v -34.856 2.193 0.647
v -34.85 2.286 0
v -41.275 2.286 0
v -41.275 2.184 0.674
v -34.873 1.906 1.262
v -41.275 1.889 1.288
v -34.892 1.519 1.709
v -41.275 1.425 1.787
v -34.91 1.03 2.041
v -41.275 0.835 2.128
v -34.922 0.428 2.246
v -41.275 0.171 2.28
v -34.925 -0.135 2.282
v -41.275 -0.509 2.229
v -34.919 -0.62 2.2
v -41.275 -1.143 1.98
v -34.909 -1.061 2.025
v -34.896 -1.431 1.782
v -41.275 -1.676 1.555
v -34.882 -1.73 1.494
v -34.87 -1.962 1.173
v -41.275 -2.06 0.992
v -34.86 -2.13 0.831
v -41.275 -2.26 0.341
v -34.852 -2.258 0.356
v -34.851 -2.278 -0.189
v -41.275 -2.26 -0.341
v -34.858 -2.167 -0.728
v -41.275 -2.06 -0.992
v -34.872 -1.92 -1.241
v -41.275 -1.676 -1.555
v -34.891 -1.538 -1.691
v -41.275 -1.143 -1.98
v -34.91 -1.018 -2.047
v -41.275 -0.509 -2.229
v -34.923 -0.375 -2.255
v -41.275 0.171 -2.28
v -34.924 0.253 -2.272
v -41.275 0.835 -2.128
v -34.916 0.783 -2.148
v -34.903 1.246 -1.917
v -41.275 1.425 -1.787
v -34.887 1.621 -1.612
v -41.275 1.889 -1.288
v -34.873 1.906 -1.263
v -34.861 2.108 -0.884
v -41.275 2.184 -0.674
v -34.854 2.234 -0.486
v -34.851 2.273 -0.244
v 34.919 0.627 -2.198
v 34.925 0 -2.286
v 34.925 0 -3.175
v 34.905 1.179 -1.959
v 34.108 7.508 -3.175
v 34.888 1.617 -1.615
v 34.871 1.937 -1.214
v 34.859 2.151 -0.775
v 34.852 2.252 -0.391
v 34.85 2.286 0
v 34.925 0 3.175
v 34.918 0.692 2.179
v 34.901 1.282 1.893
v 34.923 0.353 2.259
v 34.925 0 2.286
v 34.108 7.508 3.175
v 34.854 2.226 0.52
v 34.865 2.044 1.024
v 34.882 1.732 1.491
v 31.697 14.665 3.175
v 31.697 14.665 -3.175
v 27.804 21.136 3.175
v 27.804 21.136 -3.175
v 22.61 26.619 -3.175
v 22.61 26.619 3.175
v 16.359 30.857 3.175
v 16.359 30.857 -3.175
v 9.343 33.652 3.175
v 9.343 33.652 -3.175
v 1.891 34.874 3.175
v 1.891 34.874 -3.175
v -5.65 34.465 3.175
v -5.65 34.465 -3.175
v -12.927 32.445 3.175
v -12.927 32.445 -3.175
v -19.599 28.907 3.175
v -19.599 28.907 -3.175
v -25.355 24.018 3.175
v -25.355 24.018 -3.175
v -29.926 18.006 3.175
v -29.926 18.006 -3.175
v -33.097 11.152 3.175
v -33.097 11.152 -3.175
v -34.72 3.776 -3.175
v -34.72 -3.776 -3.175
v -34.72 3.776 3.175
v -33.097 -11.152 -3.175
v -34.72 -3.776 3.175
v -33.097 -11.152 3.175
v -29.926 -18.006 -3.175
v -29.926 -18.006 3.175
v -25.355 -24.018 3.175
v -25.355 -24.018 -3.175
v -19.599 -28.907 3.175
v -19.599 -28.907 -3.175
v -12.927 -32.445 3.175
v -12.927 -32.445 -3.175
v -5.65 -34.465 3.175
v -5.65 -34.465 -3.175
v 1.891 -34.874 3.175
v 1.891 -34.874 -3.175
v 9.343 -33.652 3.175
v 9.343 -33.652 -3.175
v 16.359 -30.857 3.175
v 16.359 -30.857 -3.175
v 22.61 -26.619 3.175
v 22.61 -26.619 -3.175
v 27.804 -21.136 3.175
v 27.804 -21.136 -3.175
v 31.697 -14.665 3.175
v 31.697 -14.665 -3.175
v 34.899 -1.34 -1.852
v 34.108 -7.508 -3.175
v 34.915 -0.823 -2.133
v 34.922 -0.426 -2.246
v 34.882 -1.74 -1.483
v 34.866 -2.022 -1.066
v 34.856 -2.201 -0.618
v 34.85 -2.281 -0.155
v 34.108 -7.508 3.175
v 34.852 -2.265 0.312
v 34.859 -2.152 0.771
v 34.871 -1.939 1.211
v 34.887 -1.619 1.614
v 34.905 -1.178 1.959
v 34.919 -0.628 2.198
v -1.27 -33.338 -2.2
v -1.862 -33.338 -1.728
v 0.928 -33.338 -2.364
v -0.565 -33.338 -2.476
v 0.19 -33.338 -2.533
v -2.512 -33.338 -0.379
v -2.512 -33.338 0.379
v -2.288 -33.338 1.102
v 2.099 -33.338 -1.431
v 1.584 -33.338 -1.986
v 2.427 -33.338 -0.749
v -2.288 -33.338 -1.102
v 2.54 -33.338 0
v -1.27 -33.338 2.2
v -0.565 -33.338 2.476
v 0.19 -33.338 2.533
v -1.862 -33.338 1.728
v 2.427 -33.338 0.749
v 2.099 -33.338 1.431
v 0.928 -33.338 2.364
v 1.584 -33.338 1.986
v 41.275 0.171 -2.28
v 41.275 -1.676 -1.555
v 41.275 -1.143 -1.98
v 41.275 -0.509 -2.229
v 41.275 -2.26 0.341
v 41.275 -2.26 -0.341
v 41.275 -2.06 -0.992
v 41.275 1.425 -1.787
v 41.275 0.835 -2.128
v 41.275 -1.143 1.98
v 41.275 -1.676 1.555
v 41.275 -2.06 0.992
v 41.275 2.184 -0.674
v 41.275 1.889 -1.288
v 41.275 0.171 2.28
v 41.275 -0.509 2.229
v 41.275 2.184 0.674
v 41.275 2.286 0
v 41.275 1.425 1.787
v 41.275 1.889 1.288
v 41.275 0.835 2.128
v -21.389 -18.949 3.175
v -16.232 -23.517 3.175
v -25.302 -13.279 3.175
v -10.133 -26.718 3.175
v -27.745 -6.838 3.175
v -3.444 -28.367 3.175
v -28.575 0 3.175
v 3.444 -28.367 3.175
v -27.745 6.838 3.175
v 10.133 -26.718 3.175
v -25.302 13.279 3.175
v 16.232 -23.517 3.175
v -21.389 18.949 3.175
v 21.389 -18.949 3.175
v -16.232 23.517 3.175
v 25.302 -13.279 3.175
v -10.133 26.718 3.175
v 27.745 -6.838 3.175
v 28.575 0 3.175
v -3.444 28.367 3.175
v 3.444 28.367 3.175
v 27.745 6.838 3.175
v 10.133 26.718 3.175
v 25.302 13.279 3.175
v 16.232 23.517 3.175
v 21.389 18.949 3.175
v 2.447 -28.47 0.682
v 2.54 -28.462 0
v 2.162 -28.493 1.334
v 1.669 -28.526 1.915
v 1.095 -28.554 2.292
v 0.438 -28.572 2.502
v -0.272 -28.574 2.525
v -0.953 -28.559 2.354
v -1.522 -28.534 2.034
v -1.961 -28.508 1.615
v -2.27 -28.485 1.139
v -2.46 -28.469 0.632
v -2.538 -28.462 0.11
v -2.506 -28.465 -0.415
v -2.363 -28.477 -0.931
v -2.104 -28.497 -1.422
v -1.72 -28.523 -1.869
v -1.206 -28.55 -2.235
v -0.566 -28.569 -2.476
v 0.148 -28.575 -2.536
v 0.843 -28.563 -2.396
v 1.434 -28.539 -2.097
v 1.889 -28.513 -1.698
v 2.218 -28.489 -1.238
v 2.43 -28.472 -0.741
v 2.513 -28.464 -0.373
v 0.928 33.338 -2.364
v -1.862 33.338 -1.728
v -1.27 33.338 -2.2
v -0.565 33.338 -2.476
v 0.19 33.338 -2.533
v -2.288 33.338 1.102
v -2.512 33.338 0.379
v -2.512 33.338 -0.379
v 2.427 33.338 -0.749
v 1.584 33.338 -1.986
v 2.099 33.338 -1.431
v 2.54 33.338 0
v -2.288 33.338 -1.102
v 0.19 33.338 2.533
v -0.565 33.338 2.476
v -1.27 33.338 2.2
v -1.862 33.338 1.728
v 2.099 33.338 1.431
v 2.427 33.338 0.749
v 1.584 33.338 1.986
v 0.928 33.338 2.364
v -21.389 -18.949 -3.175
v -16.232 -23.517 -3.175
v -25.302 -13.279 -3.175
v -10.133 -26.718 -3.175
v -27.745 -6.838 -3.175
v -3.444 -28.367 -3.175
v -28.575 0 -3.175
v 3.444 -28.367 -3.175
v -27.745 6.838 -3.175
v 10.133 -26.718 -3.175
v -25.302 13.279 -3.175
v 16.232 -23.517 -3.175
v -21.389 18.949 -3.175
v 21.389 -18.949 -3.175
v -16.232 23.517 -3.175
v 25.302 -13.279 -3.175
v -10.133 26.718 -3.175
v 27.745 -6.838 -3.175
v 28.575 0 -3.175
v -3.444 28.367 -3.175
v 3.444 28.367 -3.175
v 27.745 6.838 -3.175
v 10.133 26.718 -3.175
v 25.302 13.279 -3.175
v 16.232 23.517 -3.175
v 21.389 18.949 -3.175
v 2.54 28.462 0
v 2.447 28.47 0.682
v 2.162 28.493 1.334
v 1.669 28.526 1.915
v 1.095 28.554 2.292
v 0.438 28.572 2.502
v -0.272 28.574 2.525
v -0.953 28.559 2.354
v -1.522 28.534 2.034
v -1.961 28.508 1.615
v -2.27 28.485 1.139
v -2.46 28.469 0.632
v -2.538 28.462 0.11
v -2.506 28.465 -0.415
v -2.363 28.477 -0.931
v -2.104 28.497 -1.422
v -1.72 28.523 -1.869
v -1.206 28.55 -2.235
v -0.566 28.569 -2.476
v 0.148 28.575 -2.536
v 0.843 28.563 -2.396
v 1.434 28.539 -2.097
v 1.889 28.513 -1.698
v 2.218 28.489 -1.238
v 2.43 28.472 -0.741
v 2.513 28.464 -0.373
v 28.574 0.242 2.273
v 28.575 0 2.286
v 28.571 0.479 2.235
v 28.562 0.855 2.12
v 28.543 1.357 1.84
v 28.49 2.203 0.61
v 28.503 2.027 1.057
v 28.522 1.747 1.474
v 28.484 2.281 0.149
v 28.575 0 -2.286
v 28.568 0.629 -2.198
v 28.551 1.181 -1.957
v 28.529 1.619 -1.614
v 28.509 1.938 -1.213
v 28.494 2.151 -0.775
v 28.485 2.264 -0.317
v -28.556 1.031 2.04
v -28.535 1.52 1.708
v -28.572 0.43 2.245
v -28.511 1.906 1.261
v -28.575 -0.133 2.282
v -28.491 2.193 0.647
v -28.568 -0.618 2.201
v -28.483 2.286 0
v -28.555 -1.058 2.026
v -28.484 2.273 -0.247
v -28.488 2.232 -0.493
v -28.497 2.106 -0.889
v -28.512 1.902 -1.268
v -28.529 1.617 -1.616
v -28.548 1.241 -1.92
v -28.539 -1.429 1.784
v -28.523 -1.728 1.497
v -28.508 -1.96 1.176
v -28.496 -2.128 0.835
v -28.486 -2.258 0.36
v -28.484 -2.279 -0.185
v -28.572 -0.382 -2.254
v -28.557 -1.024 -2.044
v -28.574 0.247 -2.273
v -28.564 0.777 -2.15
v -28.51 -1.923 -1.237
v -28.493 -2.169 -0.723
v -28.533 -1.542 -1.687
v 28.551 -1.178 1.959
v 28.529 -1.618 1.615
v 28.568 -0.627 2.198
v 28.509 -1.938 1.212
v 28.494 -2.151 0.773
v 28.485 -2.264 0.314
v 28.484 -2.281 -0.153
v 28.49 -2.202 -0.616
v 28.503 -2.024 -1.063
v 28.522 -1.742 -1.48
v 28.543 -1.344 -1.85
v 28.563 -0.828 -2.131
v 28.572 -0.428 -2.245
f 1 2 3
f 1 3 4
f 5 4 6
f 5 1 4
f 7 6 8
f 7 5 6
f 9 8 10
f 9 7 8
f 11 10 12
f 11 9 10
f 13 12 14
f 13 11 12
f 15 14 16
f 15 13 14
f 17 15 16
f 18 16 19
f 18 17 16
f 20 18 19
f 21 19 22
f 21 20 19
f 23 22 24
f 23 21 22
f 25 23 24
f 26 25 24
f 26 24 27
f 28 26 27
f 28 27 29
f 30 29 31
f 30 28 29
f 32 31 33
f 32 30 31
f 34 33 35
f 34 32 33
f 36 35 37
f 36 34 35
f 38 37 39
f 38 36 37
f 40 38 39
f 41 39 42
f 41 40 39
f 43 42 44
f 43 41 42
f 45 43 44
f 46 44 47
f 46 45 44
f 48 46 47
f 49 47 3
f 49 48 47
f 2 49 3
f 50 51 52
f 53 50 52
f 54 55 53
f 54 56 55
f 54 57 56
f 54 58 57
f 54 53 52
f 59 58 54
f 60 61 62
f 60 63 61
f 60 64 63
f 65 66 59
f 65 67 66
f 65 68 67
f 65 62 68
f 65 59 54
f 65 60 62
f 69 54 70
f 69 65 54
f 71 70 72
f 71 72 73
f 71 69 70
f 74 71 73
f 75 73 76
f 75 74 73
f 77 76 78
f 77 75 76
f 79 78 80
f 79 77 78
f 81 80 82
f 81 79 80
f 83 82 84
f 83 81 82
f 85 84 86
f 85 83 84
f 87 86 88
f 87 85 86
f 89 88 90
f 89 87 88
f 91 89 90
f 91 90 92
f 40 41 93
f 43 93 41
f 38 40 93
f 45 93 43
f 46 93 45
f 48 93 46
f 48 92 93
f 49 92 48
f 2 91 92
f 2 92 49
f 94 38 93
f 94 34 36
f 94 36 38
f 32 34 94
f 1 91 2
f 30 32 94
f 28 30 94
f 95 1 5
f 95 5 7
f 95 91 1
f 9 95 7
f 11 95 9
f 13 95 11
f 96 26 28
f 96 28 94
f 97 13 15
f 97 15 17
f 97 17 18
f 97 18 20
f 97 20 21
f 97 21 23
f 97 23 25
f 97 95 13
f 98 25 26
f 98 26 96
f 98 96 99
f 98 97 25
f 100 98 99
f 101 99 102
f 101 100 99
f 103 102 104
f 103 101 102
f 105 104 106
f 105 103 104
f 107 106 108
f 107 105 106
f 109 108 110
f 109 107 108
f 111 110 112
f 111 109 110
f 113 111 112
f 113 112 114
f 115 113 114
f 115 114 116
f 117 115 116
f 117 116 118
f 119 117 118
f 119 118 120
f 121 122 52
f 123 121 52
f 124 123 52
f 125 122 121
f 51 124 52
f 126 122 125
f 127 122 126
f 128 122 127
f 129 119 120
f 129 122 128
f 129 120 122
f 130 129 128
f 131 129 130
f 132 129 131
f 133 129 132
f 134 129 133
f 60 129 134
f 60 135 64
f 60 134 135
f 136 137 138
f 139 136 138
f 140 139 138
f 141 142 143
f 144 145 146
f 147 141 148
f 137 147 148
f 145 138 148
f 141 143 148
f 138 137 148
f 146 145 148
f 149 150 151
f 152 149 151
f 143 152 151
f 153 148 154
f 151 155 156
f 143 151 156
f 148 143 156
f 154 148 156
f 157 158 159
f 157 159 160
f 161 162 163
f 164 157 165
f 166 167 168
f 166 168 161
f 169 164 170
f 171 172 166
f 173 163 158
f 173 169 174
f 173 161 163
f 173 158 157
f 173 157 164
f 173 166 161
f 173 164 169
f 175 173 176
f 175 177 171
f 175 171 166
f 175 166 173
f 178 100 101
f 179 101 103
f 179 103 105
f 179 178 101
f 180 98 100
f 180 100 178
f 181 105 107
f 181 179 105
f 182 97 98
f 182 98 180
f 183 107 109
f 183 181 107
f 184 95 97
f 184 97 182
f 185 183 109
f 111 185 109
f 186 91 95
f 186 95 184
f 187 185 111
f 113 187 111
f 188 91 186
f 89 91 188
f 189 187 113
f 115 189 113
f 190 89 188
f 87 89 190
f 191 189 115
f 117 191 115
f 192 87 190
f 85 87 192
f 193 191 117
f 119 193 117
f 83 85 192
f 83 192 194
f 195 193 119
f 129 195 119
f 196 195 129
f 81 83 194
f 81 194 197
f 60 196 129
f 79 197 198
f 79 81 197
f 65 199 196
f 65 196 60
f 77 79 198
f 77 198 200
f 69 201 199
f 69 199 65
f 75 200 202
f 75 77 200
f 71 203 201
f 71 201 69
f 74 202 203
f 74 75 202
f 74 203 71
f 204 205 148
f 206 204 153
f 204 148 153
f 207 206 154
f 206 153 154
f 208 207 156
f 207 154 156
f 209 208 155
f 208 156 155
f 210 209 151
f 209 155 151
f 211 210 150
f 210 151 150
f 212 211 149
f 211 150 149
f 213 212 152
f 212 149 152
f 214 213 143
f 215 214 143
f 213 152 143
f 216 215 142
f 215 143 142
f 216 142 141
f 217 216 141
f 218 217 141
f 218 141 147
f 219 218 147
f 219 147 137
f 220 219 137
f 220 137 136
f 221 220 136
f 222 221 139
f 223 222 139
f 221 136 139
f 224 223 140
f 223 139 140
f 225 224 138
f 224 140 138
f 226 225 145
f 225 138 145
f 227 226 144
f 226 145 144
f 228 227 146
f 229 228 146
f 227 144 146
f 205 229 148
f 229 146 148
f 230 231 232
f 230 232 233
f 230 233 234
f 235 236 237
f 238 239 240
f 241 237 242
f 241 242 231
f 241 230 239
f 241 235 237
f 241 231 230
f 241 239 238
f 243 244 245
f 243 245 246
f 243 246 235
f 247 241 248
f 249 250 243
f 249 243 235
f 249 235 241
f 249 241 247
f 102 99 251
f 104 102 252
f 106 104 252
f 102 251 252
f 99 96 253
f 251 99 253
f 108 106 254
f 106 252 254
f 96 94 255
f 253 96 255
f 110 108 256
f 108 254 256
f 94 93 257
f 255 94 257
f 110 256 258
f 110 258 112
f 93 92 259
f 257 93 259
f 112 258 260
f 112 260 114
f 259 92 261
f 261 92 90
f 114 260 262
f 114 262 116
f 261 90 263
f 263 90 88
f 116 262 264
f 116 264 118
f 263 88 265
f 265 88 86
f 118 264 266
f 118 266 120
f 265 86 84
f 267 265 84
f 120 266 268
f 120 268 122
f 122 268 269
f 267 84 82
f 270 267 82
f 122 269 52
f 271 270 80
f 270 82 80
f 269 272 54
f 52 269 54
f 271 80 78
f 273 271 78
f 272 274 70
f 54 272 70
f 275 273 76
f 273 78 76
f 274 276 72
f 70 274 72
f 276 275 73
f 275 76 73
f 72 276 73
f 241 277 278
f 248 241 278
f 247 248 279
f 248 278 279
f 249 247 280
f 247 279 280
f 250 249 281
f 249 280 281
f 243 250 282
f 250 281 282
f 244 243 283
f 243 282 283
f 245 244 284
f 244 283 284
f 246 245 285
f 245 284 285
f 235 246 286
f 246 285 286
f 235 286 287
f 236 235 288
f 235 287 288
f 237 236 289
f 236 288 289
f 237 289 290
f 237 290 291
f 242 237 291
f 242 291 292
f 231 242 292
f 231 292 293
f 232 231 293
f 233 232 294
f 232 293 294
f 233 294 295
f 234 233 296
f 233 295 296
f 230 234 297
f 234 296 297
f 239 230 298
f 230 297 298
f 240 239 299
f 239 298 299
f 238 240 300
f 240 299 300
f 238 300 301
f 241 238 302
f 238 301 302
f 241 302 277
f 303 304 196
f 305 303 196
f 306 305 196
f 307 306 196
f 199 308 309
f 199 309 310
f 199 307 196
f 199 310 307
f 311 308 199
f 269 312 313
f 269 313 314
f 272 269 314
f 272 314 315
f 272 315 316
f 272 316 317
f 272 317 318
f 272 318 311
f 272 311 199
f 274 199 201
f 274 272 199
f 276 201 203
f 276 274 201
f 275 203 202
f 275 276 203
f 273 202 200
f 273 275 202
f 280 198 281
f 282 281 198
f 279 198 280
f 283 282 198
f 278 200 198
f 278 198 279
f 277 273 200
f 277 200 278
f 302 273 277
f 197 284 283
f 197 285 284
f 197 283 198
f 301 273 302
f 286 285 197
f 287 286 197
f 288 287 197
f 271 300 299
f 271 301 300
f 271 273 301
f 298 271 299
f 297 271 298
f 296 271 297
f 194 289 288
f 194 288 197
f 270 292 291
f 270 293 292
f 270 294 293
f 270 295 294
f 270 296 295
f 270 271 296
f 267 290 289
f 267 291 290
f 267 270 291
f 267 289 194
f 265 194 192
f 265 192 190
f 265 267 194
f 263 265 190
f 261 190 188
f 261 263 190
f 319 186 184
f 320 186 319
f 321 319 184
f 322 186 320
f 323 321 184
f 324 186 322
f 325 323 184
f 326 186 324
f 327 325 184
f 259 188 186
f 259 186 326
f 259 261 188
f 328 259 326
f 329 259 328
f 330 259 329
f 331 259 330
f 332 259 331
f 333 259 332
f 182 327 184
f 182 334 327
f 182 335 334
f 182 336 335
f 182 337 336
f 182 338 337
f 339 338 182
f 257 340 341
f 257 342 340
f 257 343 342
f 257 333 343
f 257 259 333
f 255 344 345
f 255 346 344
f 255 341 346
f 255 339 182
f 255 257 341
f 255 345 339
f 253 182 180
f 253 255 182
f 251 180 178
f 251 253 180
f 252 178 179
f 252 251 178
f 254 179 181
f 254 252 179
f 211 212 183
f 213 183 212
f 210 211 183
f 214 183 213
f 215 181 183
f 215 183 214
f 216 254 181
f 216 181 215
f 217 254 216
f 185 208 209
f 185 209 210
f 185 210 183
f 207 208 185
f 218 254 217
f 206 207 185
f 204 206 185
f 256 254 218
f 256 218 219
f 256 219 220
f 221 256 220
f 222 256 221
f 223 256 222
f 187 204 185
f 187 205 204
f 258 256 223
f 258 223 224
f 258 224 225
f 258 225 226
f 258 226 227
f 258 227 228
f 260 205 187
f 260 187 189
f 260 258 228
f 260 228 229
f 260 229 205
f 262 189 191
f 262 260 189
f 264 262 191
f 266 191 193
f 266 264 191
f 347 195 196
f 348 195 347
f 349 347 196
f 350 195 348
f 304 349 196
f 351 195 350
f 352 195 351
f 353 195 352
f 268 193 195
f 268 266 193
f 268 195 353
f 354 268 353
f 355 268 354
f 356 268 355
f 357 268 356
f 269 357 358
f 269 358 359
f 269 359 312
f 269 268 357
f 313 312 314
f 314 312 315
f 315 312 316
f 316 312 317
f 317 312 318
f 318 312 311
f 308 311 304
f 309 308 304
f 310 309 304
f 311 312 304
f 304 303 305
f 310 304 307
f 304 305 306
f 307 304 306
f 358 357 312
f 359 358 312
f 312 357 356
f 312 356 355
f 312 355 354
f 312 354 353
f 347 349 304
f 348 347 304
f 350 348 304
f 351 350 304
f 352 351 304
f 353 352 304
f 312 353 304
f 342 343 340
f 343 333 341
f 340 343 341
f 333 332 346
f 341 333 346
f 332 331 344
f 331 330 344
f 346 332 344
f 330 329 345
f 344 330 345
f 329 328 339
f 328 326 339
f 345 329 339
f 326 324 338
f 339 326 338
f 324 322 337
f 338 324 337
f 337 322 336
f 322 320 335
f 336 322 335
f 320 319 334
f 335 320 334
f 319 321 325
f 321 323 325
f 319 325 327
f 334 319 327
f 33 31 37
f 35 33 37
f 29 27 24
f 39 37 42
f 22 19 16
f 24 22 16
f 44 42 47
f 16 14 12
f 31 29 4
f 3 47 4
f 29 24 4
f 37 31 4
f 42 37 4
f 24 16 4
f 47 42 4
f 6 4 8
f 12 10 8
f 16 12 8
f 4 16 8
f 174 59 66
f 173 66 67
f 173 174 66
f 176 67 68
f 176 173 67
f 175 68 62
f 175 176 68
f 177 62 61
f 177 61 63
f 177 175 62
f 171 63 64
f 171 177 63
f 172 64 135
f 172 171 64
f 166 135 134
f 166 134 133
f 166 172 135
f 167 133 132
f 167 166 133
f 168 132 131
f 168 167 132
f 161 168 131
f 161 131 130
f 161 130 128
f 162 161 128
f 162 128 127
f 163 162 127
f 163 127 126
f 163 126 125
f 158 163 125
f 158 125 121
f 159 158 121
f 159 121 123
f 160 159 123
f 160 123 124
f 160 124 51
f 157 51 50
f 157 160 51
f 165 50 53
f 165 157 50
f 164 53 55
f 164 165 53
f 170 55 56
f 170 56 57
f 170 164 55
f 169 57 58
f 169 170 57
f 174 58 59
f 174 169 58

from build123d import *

# Parameters (mm, degrees)
F0_R     = 34.925
F0_R_2   = 28.575
F1_DEPTH = 3.175
F2_R     = 2.286
F3_DEPTH = 41.275
F4_R     = 2.54
F5_DEPTH = 33.3375
F6_DEPTH = 12.7


with BuildPart() as f1:
    # F0 (on Top) → F1 (new body, symmetric)
    with BuildSketch(Plane.XY):
        Circle(F0_R)
        Circle(F0_R_2, mode=Mode.SUBTRACT)
    extrude(amount=F1_DEPTH, both=True)

    # F2 (on Right) → F3 (join, symmetric)
    with BuildSketch(Plane.YZ):
        Circle(F2_R)
    extrude(amount=F3_DEPTH, both=True)

    # F4 (on Front) → F5 (cut, symmetric)
    with BuildSketch(Plane.XZ):
        Circle(F4_R)
    extrude(amount=F5_DEPTH, both=True, mode=Mode.SUBTRACT)

    # F0 (on Top) → F6 (cut, symmetric)
    with BuildSketch(Plane.XY):
        Circle(F0_R_2)
    extrude(amount=F6_DEPTH, both=True, mode=Mode.SUBTRACT)


solid = f1.part
